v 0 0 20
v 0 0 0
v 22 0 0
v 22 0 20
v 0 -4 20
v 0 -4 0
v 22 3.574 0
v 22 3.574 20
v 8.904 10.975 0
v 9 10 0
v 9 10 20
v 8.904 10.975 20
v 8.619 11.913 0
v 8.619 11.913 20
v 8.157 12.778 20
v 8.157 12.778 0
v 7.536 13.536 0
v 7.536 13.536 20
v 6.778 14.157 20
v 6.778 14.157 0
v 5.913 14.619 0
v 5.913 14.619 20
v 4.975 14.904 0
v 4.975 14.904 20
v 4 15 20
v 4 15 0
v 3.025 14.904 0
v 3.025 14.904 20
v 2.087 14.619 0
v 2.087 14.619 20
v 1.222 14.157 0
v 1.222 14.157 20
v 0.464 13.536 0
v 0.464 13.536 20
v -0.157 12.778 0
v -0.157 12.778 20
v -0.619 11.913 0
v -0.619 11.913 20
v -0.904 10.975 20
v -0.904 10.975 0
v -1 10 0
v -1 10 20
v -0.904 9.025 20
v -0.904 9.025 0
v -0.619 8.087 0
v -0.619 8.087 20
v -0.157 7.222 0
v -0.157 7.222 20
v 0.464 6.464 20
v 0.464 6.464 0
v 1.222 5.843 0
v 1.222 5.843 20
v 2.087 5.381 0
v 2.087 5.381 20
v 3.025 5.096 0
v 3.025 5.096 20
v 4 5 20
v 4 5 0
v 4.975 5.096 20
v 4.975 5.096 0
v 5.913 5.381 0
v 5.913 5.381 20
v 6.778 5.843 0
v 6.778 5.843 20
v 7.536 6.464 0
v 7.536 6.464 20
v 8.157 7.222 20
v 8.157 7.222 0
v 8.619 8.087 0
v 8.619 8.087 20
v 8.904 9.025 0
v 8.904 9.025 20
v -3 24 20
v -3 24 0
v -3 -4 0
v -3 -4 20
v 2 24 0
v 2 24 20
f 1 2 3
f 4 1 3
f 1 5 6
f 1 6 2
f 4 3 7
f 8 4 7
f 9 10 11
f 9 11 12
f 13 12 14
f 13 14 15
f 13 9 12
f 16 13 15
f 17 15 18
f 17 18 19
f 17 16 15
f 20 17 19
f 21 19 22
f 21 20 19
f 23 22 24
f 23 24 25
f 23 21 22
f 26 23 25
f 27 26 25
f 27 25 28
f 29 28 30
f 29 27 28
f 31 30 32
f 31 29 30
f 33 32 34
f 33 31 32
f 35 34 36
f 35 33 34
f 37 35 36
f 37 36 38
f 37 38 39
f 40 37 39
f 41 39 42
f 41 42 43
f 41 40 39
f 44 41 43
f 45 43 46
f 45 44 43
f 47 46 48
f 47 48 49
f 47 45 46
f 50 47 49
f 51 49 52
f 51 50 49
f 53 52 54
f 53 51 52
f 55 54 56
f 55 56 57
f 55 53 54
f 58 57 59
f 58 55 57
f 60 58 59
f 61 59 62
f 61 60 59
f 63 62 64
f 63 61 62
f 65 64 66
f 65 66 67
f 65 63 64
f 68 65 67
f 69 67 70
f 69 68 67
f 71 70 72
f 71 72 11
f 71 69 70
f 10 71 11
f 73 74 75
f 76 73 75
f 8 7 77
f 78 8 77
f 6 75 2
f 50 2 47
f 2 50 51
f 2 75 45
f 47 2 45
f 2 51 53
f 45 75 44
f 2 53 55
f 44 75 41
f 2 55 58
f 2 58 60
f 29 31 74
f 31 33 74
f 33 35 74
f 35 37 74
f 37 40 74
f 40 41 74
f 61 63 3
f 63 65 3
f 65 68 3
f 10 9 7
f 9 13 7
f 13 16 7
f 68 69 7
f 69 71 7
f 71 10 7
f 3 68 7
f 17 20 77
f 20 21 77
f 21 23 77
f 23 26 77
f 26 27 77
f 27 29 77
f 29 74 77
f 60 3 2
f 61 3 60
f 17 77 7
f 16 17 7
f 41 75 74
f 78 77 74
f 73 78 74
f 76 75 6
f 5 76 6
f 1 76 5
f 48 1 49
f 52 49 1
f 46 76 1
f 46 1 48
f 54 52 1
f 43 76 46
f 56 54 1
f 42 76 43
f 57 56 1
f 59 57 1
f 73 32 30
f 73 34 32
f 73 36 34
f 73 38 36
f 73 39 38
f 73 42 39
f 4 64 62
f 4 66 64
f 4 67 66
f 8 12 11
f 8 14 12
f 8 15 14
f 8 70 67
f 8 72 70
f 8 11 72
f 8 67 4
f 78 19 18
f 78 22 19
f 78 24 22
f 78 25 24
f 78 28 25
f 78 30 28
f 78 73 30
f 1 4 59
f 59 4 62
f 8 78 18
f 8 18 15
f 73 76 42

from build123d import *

# Parameters (mm, degrees)
ESQUISSE1_R          = 5
BASE_EXTRUSION_DEPTH = 20


with BuildPart() as part:
    # Esquisse1 → Base-Extrusion (new body)
    with BuildSketch(Plane.XY):
        Polygon((0, 0), (22, 0), (22, 3.574468085), (2, 24), (-3, 24), (-3, -4), (0, -4), align=None)
        with Locations((4, 10)):
            Circle(ESQUISSE1_R, mode=Mode.SUBTRACT)
    extrude(amount=BASE_EXTRUSION_DEPTH)


solid = part.part
